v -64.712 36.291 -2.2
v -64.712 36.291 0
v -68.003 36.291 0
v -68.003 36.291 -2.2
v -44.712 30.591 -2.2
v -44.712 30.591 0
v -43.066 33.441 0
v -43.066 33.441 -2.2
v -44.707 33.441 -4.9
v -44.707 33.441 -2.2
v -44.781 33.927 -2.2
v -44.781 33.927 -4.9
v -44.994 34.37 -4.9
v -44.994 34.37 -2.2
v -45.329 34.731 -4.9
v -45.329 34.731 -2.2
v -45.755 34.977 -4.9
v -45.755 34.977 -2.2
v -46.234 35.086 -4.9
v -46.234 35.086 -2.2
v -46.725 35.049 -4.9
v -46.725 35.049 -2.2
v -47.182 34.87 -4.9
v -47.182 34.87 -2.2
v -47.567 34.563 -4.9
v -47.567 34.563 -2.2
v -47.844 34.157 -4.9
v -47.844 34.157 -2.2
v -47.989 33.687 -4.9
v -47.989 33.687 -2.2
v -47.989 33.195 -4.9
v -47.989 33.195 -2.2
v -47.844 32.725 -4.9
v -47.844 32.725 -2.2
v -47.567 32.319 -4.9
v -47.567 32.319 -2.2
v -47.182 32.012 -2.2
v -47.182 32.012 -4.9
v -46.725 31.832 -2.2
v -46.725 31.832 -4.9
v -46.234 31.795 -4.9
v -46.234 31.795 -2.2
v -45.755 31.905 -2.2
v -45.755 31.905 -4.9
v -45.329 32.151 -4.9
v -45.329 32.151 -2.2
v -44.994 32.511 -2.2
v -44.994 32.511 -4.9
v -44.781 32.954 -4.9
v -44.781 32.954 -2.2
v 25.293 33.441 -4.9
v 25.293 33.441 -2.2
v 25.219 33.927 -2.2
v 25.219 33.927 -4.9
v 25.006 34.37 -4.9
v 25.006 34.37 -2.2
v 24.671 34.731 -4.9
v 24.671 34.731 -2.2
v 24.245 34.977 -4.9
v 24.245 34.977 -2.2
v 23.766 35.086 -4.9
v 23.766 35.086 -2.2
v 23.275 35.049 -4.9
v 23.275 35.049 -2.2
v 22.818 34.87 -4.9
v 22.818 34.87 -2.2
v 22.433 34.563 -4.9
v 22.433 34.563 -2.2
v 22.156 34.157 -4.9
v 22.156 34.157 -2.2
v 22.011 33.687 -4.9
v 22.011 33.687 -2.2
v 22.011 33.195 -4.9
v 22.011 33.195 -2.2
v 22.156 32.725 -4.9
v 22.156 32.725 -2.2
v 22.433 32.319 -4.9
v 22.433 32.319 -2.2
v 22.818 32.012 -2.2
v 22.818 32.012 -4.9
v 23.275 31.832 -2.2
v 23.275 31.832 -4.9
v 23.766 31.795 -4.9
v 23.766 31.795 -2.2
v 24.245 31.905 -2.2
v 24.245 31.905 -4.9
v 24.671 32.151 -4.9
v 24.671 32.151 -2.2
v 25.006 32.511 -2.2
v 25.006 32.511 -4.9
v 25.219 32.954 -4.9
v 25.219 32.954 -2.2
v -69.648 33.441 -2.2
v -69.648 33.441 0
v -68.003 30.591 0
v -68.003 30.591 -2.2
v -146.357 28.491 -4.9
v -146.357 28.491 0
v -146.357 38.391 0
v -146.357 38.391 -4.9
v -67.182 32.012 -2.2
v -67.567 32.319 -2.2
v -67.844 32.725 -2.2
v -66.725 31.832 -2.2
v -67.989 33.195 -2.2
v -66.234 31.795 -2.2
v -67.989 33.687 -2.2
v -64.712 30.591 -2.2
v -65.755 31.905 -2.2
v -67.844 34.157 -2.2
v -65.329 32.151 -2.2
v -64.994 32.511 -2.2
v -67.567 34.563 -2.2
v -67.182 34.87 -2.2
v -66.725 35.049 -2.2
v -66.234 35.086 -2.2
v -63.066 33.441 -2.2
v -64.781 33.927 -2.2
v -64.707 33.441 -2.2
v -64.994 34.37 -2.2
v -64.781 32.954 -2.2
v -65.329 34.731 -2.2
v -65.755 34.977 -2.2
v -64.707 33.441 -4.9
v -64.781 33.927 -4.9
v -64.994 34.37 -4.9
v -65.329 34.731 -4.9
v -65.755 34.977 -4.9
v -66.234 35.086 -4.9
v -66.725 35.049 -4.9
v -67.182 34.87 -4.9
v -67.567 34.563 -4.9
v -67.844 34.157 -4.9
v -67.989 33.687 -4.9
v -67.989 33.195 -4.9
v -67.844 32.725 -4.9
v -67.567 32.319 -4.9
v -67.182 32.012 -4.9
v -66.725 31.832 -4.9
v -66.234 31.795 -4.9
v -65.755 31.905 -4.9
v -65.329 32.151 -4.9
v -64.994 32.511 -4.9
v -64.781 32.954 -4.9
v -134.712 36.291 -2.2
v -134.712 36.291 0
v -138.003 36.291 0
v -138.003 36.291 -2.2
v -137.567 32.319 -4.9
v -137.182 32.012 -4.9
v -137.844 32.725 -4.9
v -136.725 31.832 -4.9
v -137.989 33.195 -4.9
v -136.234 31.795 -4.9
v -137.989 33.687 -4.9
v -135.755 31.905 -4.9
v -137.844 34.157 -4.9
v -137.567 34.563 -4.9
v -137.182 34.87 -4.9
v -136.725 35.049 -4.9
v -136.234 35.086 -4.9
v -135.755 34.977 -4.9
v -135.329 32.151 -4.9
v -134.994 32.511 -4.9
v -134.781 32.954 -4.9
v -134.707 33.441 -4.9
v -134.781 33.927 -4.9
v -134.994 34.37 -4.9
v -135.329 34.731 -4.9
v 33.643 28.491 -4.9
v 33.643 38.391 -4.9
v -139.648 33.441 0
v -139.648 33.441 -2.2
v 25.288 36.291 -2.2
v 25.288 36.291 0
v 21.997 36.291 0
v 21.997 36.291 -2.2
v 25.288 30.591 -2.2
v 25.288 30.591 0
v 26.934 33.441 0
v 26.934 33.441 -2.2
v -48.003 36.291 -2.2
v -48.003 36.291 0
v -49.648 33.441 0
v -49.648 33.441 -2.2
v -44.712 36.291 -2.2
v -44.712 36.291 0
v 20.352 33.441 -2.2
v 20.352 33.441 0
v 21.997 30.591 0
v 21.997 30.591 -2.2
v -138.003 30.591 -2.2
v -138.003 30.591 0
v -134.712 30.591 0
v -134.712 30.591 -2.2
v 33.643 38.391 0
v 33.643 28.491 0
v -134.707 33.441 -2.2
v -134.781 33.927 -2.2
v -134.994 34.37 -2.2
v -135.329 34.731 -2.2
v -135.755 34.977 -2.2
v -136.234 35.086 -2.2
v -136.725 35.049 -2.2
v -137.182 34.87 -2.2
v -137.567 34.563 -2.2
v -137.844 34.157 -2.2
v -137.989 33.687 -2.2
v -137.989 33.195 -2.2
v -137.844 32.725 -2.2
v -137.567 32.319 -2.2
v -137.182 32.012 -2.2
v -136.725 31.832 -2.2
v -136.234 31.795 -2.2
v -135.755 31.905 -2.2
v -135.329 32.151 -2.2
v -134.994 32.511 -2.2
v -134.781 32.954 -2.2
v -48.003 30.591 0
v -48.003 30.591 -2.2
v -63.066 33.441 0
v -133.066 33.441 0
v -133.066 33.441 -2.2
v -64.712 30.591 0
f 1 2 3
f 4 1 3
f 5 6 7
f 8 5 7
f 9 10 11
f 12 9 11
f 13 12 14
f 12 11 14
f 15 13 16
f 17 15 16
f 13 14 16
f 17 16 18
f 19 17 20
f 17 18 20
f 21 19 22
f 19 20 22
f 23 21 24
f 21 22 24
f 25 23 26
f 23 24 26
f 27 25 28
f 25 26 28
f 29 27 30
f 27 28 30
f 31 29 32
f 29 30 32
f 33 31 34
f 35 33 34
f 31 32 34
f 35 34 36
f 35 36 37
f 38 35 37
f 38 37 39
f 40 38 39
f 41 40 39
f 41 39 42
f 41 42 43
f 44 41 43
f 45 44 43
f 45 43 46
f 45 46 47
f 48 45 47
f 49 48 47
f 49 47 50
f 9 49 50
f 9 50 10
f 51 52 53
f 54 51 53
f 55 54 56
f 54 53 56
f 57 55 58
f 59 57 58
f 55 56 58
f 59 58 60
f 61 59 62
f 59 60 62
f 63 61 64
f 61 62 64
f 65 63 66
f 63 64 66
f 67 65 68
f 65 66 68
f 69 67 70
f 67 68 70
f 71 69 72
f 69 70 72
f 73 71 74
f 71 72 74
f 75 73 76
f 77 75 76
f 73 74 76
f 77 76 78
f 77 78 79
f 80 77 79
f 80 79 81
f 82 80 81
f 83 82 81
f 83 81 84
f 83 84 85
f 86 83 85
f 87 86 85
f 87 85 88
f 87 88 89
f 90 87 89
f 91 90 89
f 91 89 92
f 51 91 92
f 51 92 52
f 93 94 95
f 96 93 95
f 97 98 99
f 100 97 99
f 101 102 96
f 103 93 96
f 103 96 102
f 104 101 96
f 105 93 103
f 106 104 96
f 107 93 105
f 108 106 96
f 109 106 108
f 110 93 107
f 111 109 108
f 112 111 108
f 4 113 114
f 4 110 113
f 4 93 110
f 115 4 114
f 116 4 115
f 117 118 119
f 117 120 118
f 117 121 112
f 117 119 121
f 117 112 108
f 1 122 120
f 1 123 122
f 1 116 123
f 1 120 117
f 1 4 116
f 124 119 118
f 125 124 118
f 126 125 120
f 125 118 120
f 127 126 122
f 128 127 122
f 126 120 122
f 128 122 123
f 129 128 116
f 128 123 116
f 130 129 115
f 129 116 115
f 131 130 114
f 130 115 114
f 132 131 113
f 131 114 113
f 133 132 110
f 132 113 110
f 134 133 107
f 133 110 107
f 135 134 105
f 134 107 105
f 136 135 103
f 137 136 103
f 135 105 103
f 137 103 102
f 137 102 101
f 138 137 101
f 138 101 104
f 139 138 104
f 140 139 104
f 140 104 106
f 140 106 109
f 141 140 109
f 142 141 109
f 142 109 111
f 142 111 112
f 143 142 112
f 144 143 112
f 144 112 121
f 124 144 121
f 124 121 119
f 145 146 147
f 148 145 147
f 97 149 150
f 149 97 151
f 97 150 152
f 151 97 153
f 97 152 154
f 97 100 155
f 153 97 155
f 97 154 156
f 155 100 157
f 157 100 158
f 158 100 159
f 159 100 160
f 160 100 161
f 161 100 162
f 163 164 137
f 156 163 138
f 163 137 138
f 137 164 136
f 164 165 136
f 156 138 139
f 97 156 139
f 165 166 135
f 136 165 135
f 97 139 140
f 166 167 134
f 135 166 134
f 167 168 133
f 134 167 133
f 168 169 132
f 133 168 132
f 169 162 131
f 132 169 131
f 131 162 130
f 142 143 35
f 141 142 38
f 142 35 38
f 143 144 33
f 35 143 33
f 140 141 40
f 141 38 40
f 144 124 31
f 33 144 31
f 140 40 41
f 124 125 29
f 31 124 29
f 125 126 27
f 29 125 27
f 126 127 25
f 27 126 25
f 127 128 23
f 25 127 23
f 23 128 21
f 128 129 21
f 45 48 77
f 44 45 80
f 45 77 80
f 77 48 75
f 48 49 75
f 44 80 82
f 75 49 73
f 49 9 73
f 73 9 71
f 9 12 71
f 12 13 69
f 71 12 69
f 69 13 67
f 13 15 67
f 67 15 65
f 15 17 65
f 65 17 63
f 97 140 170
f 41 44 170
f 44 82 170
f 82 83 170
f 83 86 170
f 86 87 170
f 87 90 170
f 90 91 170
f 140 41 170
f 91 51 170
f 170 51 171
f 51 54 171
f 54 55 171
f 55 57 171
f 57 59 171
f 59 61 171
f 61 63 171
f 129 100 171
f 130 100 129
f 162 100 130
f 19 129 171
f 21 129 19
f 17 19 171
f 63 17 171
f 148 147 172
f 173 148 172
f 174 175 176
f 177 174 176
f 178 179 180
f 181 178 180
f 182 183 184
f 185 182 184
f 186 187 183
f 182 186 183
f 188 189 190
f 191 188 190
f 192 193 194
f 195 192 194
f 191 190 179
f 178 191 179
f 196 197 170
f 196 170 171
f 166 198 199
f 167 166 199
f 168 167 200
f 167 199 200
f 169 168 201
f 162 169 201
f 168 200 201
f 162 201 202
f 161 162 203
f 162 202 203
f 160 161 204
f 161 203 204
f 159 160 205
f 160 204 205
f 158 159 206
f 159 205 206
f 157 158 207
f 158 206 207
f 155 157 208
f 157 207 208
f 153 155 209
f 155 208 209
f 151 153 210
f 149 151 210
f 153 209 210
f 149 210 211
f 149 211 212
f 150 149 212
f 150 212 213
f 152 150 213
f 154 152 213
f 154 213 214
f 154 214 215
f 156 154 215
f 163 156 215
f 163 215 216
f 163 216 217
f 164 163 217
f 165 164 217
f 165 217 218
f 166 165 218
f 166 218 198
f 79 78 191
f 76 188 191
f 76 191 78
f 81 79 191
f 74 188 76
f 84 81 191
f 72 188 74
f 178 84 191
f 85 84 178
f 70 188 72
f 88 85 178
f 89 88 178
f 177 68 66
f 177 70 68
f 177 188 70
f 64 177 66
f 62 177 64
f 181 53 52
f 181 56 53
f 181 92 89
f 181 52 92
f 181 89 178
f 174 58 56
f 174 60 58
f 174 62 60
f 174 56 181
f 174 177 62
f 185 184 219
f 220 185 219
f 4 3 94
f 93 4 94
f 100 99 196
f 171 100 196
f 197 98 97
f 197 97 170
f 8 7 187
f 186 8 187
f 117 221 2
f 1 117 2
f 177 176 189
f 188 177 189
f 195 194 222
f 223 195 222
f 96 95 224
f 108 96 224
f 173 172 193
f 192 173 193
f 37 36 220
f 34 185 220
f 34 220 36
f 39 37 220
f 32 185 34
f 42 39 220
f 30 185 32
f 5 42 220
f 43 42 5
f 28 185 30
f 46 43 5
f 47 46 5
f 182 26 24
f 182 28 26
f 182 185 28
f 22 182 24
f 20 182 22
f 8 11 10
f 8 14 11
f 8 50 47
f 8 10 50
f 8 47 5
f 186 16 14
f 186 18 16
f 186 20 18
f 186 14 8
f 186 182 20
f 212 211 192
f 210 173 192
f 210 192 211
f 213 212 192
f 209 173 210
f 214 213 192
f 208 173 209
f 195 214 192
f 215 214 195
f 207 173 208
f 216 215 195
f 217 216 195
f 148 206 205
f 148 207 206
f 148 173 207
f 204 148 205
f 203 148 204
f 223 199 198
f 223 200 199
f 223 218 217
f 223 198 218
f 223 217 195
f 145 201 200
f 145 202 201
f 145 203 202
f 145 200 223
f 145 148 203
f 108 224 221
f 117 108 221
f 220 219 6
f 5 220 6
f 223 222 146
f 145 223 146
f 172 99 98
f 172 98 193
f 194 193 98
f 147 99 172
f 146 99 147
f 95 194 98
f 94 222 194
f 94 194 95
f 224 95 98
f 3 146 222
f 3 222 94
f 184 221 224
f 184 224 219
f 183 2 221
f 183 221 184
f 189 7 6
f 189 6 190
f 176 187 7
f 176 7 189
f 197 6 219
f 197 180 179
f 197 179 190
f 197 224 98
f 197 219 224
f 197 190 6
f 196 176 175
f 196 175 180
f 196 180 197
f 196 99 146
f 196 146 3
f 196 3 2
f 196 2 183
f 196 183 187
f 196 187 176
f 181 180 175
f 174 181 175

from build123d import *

# Parameters (mm, degrees)
SKETCH1_W           = 180
SKETCH1_H           = 9.9
BOSS_EXTRUDE1_DEPTH = 4.9
SKETCH2_R           = 1.65
CUT_EXTRUDE1_DEPTH  = 5.9
CUT_EXTRUDE2_DEPTH  = 2.2


with BuildPart() as part:
    # Sketch1 → Boss-Extrude1 (new body)
    with BuildSketch(Plane.XY):
        with Locations((-56.357347179, 33.440788785)):
            Rectangle(SKETCH1_W, SKETCH1_H)
    extrude(amount=-BOSS_EXTRUDE1_DEPTH)

    # Sketch2 → Cut-Extrude1 (cut, through all)
    with BuildSketch(Plane.XY):
        with Locations((-136.357347179, 33.440788785)):
            Circle(SKETCH2_R)
        with Locations((-66.357347179, 33.440788785)):
            Circle(SKETCH2_R)
        with Locations((-46.357347179, 33.440788785)):
            Circle(SKETCH2_R)
        with Locations((23.642652821, 33.440788785)):
            Circle(SKETCH2_R)
    extrude(amount=-CUT_EXTRUDE1_DEPTH, mode=Mode.SUBTRACT)

    # Sketch3 → Cut-Extrude2 (cut)
    with BuildSketch(Plane.XY):
        Polygon((-134.711898912, 30.590788785), (-133.066450645, 33.440788785), (-134.711898912, 36.290788785), (-138.002795446, 36.290788785), (-139.648243713, 33.440788785), (-138.002795446, 30.590788785), align=None)
        Polygon((-64.711898912, 30.590788785), (-63.066450645, 33.440788785), (-64.711898912, 36.290788785), (-68.002795446, 36.290788785), (-69.648243713, 33.440788785), (-68.002795446, 30.590788785), align=None)
        Polygon((-44.711898912, 30.590788785), (-43.066450645, 33.440788785), (-44.711898912, 36.290788785), (-48.002795446, 36.290788785), (-49.648243713, 33.440788785), (-48.002795446, 30.590788785), align=None)
        Polygon((25.288101088, 30.590788785), (26.933549355, 33.440788785), (25.288101088, 36.290788785), (21.997204554, 36.290788785), (20.351756287, 33.440788785), (21.997204554, 30.590788785), align=None)
    extrude(amount=-CUT_EXTRUDE2_DEPTH, mode=Mode.SUBTRACT)


solid = part.part
